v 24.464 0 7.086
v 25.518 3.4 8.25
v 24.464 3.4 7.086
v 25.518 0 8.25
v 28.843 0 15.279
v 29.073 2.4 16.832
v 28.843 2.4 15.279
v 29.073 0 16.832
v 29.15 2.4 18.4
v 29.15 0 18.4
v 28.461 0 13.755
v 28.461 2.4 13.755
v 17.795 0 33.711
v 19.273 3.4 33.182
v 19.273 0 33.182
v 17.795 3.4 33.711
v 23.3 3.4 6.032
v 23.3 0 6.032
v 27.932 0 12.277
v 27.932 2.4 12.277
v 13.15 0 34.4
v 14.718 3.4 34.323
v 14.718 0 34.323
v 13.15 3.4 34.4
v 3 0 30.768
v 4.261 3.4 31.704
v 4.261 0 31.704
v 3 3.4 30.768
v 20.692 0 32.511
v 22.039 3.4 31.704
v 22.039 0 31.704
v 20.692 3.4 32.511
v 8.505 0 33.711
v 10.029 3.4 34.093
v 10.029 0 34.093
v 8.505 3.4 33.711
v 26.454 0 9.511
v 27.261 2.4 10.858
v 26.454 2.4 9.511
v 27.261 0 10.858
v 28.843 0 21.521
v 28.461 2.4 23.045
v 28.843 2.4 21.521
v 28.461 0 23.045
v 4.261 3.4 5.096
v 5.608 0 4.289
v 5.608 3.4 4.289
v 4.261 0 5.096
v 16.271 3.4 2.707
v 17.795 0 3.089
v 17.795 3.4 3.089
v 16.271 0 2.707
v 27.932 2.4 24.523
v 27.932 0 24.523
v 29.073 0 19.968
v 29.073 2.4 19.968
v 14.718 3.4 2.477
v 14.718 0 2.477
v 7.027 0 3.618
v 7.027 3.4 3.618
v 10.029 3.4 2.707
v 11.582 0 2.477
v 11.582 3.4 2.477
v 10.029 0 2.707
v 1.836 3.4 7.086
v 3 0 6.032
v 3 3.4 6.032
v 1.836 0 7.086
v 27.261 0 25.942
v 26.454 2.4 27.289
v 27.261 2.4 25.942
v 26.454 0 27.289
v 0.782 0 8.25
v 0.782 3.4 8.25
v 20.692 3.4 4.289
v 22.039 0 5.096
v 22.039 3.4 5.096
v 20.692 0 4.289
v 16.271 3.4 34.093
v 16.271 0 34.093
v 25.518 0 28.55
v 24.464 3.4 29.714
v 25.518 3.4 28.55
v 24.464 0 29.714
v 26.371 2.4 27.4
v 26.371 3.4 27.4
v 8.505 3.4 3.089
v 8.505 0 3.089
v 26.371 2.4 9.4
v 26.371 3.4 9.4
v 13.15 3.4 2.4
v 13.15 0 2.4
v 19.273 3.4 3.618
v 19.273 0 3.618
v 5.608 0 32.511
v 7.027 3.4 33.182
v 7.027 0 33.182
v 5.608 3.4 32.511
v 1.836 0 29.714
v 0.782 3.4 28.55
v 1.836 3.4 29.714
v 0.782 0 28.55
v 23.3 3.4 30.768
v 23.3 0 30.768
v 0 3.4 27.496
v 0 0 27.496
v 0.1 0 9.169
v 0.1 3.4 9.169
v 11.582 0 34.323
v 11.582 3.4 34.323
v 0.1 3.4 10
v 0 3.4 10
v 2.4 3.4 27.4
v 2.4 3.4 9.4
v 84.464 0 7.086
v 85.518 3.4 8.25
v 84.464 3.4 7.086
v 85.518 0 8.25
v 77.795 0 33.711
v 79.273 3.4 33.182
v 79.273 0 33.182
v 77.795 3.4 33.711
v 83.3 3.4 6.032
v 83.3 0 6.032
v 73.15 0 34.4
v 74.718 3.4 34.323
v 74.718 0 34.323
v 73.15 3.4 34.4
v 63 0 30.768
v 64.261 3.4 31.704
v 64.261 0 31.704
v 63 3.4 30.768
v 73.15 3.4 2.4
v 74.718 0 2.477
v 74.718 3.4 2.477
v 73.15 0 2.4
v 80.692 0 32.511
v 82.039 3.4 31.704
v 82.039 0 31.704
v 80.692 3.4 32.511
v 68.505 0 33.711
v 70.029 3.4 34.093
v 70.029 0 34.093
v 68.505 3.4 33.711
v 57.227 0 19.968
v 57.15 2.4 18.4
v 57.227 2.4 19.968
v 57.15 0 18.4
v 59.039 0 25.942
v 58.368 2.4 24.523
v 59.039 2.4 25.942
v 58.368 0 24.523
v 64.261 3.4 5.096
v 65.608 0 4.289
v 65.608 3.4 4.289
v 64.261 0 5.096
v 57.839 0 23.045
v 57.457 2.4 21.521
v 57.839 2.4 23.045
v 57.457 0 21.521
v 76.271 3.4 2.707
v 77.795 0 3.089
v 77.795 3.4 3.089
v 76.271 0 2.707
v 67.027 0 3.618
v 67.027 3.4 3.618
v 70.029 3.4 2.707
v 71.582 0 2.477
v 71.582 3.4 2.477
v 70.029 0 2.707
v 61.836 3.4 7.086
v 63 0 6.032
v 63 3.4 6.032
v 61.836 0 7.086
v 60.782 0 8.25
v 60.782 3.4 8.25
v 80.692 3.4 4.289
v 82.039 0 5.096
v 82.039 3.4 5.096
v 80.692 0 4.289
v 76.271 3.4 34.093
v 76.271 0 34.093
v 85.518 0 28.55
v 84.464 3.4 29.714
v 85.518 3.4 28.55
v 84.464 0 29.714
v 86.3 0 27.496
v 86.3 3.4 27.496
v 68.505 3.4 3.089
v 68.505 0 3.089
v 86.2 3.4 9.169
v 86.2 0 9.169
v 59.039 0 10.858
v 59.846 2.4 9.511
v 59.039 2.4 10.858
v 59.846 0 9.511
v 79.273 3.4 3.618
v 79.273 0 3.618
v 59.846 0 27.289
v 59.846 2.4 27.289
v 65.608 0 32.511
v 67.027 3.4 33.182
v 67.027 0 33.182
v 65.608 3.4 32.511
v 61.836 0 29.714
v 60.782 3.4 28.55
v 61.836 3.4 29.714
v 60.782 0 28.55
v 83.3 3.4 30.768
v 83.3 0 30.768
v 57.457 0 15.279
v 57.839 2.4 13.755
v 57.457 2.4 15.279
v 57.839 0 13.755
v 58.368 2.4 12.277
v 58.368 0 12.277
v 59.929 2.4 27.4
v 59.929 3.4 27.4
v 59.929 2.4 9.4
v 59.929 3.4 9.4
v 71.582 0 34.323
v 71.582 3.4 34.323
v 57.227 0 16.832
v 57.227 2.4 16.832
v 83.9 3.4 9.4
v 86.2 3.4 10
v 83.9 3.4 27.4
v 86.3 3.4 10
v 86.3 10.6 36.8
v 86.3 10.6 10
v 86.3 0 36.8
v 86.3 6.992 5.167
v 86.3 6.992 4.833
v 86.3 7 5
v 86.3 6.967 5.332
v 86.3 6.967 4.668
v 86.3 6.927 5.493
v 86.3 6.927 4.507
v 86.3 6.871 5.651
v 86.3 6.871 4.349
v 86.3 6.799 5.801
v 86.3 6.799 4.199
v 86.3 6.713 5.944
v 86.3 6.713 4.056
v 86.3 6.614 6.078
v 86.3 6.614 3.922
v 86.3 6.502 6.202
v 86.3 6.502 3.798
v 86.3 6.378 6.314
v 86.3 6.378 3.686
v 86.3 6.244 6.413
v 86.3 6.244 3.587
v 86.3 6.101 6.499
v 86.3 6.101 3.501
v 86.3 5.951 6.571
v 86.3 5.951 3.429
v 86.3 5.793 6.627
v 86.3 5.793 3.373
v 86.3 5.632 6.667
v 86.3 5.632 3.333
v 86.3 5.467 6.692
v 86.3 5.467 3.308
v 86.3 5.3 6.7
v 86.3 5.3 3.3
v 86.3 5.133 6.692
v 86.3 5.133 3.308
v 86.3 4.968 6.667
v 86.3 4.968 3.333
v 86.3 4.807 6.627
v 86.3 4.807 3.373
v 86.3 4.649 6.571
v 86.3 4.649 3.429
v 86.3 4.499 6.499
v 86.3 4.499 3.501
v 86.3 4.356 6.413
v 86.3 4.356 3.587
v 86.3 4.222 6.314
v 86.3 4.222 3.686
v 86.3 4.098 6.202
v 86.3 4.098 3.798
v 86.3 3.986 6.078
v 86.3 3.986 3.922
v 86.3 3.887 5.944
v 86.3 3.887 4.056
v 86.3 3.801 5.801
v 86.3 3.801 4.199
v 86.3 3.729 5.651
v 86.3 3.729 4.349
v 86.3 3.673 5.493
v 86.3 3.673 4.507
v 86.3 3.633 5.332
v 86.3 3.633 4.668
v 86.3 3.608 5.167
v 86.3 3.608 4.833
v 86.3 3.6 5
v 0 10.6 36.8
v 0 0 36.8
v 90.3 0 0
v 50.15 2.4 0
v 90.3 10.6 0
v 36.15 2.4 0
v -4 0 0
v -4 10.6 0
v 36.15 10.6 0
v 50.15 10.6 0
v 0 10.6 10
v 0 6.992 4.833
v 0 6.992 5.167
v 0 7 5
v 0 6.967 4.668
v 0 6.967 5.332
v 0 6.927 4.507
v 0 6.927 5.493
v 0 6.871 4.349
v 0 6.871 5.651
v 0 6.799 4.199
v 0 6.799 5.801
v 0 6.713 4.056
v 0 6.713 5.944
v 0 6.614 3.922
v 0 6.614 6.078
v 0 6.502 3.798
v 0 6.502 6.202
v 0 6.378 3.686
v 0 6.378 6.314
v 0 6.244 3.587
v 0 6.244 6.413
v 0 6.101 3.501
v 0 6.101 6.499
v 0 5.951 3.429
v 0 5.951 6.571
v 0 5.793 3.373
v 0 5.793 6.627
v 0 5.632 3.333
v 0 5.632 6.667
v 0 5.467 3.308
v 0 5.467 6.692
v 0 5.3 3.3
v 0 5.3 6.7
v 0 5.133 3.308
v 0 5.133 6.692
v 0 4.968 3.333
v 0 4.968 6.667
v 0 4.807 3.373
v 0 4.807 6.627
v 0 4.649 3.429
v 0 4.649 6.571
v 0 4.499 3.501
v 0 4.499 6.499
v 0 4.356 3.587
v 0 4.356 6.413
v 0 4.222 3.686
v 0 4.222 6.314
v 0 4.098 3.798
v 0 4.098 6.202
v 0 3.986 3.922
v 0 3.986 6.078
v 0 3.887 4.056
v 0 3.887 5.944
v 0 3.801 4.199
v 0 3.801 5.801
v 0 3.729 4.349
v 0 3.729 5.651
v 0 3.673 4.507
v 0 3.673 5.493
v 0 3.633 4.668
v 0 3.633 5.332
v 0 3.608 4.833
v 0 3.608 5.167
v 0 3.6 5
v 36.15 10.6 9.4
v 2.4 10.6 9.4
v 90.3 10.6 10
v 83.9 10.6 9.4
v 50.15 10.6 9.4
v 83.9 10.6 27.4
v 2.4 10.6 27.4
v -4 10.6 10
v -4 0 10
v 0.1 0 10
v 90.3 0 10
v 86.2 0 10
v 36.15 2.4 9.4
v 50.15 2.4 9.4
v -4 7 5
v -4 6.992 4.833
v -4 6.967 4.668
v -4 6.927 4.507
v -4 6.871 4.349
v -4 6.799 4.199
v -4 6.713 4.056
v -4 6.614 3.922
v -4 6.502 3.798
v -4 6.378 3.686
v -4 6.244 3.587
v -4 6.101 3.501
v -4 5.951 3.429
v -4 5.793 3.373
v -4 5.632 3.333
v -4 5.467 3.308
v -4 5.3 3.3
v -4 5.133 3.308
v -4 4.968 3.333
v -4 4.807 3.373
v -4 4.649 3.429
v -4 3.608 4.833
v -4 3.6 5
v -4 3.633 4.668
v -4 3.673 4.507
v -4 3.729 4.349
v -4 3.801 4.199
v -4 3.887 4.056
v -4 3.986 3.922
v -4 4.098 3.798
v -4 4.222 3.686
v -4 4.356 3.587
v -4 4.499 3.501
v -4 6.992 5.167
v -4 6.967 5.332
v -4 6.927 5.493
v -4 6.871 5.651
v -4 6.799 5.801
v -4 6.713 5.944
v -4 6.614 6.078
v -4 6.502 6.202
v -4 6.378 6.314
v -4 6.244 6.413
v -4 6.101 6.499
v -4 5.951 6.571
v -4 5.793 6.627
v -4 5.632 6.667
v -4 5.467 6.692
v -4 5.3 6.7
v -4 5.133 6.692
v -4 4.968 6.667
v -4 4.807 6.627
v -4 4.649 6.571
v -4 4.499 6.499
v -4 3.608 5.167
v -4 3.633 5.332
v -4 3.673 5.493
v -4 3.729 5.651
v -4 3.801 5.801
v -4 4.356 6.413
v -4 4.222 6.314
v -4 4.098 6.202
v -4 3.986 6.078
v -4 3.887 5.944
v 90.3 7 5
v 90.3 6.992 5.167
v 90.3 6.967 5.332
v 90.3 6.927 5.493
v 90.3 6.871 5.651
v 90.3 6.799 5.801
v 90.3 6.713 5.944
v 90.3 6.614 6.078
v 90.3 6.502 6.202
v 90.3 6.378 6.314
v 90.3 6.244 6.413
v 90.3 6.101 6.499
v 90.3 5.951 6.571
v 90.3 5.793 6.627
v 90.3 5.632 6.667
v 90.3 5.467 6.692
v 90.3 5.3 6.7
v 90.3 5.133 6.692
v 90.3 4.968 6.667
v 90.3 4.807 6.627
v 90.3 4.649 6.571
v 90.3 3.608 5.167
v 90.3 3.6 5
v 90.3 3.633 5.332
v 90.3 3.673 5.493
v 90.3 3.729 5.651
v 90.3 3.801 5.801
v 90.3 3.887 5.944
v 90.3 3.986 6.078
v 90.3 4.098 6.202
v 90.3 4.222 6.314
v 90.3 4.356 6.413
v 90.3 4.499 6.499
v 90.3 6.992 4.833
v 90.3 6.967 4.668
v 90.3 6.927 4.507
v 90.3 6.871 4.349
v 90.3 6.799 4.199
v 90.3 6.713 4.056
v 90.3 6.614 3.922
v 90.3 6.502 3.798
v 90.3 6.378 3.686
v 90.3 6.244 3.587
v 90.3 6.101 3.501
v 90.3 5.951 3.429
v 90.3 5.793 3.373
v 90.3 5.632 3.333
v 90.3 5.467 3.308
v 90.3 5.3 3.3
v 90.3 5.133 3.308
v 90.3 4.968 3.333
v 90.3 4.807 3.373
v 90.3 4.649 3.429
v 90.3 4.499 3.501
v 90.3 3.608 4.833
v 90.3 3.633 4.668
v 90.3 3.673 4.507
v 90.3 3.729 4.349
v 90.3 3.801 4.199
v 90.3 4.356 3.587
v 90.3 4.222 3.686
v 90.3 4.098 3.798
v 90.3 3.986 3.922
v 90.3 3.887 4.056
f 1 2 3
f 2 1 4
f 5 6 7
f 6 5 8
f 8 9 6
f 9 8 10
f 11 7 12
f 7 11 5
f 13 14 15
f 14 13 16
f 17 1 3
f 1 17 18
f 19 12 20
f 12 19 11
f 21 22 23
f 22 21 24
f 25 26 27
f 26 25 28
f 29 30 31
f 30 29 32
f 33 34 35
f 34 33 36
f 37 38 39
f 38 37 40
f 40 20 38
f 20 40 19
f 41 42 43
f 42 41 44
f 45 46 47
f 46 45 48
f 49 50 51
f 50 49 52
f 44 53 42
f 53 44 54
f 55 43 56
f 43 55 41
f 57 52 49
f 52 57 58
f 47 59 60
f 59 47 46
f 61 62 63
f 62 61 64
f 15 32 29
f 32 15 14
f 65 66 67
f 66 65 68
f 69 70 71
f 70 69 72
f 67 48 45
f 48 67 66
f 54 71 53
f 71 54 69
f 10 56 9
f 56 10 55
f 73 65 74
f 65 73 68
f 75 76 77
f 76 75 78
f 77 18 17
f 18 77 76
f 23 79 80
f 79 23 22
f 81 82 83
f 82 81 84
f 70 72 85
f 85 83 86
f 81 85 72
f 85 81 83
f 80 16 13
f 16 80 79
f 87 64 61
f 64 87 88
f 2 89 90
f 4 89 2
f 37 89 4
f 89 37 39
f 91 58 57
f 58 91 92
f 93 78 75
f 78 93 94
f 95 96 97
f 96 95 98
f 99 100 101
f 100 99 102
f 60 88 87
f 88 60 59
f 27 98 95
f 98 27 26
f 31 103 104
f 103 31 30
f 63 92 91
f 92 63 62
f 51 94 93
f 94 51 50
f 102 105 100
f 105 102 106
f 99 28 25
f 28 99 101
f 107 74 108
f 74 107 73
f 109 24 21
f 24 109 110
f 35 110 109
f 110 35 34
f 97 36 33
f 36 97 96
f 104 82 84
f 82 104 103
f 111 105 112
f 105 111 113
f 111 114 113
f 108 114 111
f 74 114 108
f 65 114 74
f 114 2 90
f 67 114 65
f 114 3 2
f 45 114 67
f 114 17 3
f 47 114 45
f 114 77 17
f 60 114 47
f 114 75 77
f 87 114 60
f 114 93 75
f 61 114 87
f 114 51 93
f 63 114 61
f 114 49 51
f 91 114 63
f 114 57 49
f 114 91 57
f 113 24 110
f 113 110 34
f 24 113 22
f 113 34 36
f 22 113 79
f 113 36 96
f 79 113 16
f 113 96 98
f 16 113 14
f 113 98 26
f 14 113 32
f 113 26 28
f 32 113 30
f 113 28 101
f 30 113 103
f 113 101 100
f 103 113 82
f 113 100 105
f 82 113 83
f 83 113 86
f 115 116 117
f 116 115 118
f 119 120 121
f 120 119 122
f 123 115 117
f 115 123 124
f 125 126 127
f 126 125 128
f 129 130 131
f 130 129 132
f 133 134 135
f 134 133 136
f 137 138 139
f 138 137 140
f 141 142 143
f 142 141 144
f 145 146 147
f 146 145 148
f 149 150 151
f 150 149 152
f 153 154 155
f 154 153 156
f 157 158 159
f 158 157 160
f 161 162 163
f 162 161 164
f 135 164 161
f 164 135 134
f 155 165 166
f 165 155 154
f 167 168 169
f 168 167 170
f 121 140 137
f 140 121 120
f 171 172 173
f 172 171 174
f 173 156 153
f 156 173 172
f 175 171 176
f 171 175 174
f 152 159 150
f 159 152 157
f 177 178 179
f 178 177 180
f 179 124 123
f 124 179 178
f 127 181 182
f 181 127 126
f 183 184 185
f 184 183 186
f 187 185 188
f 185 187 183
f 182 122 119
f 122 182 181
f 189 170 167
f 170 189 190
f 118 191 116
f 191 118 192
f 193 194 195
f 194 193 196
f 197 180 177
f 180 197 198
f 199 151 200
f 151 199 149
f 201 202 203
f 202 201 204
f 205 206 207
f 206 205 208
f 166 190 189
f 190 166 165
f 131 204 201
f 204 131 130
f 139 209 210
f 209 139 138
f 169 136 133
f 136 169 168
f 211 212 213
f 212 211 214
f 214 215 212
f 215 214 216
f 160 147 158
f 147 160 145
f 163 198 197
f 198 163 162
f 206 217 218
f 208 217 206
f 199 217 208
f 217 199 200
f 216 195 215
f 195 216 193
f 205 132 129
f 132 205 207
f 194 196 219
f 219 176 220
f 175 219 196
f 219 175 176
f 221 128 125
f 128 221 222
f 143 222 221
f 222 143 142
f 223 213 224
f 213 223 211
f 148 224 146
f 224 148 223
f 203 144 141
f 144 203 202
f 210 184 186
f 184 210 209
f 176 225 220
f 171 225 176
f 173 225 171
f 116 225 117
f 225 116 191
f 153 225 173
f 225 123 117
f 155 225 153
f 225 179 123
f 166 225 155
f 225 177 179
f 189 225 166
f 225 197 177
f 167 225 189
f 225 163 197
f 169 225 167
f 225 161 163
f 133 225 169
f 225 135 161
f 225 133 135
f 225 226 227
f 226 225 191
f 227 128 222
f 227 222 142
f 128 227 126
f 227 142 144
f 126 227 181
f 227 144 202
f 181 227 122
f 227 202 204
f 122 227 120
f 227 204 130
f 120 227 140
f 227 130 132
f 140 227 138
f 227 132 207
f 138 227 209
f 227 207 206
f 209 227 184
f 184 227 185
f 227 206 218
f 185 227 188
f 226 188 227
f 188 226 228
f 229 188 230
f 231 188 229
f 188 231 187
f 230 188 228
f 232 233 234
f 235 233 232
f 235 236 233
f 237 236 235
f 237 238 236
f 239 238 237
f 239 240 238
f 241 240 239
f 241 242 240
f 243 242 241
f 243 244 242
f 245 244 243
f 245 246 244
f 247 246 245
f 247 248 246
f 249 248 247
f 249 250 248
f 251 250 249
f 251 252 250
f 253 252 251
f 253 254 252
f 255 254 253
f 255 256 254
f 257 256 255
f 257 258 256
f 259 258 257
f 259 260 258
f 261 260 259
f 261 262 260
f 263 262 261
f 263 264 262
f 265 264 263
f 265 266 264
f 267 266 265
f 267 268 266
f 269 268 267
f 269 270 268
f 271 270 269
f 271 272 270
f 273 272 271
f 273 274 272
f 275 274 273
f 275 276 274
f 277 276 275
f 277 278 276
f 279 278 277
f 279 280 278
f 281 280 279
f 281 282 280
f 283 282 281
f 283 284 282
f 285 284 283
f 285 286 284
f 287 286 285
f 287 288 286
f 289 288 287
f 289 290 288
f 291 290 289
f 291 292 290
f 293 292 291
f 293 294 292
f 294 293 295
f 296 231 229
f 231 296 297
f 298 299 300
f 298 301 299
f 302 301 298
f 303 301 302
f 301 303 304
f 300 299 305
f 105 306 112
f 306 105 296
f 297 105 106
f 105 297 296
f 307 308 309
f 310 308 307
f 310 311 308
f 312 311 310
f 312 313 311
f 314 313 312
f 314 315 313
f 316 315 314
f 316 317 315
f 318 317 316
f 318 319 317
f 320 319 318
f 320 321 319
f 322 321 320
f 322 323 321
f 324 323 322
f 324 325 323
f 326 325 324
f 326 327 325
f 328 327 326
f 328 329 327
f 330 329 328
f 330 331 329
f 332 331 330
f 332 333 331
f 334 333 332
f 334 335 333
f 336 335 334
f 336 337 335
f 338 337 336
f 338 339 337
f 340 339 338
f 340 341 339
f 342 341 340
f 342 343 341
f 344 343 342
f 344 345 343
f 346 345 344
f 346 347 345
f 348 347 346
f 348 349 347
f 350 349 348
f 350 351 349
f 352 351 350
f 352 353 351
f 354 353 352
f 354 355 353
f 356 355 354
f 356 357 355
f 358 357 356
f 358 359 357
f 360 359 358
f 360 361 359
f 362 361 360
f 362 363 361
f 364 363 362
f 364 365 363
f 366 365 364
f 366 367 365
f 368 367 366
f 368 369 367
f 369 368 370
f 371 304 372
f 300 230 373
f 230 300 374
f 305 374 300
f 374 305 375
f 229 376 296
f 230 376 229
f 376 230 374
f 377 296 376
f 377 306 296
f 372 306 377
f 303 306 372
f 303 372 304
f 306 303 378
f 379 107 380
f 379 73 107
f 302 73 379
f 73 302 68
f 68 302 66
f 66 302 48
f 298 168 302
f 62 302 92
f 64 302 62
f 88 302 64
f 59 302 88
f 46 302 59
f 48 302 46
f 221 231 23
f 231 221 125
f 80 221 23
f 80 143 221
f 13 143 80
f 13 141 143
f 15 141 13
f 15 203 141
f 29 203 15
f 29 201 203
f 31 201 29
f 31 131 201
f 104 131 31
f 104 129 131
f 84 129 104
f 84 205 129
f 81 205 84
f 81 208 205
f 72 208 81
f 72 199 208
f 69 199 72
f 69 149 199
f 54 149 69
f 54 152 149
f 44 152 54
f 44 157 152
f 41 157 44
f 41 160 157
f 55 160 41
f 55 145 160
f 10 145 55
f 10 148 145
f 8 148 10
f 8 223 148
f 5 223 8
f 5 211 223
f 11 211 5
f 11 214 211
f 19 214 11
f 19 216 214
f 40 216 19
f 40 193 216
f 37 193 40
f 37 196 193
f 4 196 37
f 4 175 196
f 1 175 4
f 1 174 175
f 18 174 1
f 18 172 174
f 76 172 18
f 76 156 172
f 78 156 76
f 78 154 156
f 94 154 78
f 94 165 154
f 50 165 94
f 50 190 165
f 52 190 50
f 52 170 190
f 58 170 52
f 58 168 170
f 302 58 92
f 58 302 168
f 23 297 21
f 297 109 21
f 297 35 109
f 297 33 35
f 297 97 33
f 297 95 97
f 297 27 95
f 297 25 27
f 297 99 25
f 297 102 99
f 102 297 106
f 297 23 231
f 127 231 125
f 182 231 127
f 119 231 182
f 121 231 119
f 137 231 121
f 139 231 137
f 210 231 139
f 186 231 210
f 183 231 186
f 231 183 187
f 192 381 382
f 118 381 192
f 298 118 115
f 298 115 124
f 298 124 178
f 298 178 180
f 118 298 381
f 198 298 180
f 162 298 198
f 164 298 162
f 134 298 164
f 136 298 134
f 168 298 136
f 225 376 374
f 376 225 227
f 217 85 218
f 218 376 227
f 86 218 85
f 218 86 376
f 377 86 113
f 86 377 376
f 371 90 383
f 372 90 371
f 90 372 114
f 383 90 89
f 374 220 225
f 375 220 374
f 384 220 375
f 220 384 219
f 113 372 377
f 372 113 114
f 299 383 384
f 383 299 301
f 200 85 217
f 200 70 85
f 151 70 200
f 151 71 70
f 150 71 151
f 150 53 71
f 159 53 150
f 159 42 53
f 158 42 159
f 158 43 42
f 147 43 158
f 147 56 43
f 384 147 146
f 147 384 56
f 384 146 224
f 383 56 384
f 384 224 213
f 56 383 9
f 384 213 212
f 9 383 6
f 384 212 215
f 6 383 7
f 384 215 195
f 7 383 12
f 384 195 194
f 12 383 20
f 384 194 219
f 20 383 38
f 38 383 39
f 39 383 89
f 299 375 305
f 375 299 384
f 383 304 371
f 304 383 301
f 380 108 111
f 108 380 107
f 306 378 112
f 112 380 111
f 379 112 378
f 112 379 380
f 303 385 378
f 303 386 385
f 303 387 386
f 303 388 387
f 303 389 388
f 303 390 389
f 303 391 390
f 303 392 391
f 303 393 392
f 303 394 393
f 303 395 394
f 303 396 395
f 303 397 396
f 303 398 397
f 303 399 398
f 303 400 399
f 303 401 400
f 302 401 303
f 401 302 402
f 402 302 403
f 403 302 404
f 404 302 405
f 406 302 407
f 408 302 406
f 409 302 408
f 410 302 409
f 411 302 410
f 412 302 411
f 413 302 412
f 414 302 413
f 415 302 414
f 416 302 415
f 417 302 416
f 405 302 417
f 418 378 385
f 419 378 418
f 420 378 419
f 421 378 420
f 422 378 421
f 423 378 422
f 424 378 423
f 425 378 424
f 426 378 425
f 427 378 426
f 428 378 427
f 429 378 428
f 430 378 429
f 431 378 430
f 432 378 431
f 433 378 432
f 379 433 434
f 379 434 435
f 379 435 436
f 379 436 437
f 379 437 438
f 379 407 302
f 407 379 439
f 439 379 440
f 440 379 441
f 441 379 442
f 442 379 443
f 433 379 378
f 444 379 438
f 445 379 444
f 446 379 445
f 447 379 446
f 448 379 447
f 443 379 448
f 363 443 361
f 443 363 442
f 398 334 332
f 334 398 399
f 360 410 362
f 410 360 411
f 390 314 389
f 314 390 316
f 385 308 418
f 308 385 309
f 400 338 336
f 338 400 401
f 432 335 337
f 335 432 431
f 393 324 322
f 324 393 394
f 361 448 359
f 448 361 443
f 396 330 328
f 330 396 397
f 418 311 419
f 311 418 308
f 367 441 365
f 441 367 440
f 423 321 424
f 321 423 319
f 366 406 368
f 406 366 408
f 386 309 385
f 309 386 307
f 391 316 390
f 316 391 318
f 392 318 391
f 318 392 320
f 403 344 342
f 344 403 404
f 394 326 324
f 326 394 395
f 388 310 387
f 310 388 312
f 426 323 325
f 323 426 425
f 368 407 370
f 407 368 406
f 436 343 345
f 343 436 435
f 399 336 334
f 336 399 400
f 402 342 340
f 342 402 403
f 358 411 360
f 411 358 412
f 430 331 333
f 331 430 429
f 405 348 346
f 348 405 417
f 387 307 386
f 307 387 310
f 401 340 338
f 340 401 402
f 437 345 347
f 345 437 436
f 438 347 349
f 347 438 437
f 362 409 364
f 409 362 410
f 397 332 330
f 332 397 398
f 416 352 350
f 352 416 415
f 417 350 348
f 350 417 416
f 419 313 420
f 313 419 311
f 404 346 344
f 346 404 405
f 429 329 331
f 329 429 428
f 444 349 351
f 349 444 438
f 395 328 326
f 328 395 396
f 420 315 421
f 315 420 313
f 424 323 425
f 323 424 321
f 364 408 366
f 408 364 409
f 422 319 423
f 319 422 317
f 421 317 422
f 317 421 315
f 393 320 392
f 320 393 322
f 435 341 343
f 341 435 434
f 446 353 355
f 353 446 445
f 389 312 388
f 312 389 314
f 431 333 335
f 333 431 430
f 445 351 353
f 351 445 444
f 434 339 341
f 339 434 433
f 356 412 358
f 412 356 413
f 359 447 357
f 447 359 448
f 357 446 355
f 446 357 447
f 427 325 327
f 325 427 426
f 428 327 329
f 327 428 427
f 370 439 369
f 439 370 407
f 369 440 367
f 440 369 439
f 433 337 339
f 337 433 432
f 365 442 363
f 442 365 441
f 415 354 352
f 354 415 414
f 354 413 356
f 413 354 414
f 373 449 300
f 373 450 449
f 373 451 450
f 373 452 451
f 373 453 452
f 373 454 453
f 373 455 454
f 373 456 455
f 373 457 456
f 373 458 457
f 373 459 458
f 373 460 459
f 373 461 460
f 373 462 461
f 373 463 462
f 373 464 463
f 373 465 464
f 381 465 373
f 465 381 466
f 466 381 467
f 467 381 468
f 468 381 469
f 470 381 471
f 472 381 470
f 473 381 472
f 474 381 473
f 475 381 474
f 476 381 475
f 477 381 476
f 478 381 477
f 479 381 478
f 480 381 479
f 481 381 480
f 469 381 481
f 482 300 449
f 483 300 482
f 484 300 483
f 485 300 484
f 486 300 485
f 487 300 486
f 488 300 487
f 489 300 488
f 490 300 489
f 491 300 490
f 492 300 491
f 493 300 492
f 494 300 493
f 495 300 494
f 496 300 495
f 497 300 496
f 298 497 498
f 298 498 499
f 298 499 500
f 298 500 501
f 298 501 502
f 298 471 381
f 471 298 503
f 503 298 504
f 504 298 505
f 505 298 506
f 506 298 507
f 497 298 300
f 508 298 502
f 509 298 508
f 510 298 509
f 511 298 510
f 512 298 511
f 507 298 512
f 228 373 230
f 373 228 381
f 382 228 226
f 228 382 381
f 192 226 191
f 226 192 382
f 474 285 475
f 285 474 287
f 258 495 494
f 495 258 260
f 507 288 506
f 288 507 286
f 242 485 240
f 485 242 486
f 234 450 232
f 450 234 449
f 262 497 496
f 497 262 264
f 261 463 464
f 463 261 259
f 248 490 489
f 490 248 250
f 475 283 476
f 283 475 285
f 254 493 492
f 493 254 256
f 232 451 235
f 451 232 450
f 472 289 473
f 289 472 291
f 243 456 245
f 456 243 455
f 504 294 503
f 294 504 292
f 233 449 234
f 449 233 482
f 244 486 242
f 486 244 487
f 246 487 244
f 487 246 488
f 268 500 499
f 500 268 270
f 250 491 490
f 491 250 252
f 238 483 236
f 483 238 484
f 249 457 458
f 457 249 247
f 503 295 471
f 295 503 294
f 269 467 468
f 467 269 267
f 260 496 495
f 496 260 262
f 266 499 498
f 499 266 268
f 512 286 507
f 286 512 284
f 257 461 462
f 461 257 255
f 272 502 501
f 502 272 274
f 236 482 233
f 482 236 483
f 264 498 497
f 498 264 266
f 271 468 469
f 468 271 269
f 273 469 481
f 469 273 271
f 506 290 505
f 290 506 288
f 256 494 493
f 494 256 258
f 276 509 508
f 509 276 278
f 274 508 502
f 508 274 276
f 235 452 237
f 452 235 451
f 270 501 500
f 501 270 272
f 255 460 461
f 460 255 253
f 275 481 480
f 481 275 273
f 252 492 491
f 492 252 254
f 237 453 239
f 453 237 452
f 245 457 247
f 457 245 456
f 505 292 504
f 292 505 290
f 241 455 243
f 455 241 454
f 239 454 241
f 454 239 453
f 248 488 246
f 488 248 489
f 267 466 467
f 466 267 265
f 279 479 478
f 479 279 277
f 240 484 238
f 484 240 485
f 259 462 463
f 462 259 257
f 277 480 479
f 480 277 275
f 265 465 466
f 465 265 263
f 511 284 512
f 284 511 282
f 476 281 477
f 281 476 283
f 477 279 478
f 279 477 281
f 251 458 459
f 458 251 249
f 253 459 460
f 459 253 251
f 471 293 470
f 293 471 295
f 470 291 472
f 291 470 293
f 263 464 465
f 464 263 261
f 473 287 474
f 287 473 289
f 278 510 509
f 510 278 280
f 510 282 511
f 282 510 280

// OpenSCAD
/* ELP USB3D1080P02-H120 双眼カメラケース v0.1
 * 基板: 80x16.5mm(ELP公称)。★印刷前にノギスで3つ実測して更新すること:
 *   LENS_PITCH(レンズ中心間隔) / LENS_D(レンズ鏡筒外径) / BOARD_T(基板+裏面部品厚)
 * SHOW: 1=テストケース本体 2=スライド蓋 3=コロ助胸マウント(曲面アダプタ)
 * License: CC BY 4.0 / Kazuki Murata */
BOARD_W=80.5; BOARD_H=17.0;     // 基板ポケット(公称+遊び)
BOARD_T=6.0;                    // ★実測: 基板1.6+裏面部品
LENS_PITCH=60;                  // ★実測: レンズ中心間隔
LENS_D=18.0;                    // 実測(2026-07-03)
HOOD_D=31;  // ★フード外径実測で要確認
WALL=2.4; USB_W=11;
W=BOARD_W+2*WALL+1; H=HOOD_D+2*WALL+1; D=BOARD_T+WALL+2.2; CAVZ=H/2-(BOARD_H+1)/2;
$fn=64;
module body(){
  difference(){
    cube([W,D,H]);
    translate([WALL,WALL,CAVZ]) cube([BOARD_W+1,D,BOARD_H+1]);              // 基板室(中央高さ)
    for(s=[-1,1]) translate([W/2+s*LENS_PITCH/2,-1,H/2]) rotate([-90,0,0]) cylinder(d=HOOD_D+1,h=WALL+2); // フードごと通す大窓
    translate([W/2-7,WALL,-1]) cube([14,D,CAVZ+2]);                          // USB-C下出し(底〜基板室)
  }
  for(s=[0,1]) translate([s==0 ? -4 : W-0.1, 0, 0]) difference(){            // M3耳x2
    cube([4.1,D,10]); translate([-1,D/2,5]) rotate([0,90,0]) cylinder(d=3.4,h=7);
  }
}
module lid(){ cube([BOARD_W+0.6,1.8,BOARD_H+0.6]); }                    // 背面スライド蓋(簡易)
module chest_mount(){                                                    // 胸マウント: 胴の円錐面(R~80)に沿う受け
  difference(){
    cube([W+16,10,H+6]);
    translate([(W+16)/2,88,-1]) cylinder(r=80,h=H+8);                   // 胴カーブ
    for(s=[0,1]) translate([s*(W+8)+4,-1,(H+6)/2]) rotate([-90,0,0]) cylinder(d=3.4,h=12); // ケース耳と共締め
  }
}
SHOW=1;
if(SHOW==1) body(); else if(SHOW==2) lid(); else if(SHOW==3) chest_mount();
